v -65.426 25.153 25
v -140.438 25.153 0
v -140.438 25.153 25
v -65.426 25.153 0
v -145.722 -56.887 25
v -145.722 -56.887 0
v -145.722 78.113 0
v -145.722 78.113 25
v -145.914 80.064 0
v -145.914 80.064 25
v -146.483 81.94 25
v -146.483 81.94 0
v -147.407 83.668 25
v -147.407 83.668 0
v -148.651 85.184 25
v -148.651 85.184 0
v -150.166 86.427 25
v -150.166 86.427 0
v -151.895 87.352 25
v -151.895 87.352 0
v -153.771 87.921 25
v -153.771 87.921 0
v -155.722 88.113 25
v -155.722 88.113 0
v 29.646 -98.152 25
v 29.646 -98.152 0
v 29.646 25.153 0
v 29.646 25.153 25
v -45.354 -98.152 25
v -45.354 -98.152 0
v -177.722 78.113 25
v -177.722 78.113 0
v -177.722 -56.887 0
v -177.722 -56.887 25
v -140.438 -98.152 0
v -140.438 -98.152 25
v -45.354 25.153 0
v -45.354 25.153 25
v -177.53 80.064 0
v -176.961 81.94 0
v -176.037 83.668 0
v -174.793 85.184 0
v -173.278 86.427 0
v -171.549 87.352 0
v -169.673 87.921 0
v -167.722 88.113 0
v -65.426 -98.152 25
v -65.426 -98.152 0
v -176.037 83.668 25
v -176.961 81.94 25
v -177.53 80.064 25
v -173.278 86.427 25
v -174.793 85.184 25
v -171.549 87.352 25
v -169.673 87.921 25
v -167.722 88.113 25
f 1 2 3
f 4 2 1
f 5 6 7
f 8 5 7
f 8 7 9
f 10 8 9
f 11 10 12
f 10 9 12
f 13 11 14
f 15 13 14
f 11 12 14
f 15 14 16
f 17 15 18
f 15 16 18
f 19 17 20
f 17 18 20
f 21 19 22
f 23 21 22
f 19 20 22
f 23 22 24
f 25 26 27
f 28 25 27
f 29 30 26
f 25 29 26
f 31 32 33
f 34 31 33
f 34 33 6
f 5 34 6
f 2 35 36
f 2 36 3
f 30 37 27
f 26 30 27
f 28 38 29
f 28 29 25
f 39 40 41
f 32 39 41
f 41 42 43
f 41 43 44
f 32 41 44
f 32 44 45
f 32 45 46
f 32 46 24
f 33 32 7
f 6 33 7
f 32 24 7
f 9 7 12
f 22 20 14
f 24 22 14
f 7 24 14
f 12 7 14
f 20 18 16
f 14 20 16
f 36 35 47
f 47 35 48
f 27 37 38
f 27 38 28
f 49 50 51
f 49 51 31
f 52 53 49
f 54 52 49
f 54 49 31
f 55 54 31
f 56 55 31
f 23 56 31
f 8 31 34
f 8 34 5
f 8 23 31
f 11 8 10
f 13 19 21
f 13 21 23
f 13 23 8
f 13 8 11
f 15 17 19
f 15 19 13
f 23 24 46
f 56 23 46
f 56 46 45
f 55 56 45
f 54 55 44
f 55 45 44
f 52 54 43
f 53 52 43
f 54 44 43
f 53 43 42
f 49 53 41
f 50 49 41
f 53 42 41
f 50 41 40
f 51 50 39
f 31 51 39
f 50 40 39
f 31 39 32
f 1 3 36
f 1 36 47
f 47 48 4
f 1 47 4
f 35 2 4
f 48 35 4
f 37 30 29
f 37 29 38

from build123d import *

# Parameters (mm, degrees)
F0_W     = 75.011872
F0_H     = 123.305467
F0_W_2   = 75
F1_DEPTH = 25


with BuildPart() as f1:
    # F0 (on Top) → F1 (new body)
    with BuildSketch(Plane.XY):
        with BuildLine():
            Line((-155.722111, 88.112739), (-167.722111, 88.112739))
            ThreePointArc((-167.722111, 88.112739), (-174.793179, 85.183807), (-177.722111, 78.112739))
            Line((-177.722111, 78.112739), (-177.722111, -56.887261))
            Line((-177.722111, -56.887261), (-145.722111, -56.887261))
            Line((-145.722111, -56.887261), (-145.722111, 78.112739))
            ThreePointArc((-145.722111, 78.112739), (-148.651044, 85.183807), (-155.722111, 88.112739))
        make_face()
        with Locations((-102.93195, -36.499308)):
            Rectangle(F0_W, F0_H)
        with Locations((-7.854273, -36.499308)):
            Rectangle(F0_W_2, F0_H)
    extrude(amount=F1_DEPTH)


solid = f1.part
